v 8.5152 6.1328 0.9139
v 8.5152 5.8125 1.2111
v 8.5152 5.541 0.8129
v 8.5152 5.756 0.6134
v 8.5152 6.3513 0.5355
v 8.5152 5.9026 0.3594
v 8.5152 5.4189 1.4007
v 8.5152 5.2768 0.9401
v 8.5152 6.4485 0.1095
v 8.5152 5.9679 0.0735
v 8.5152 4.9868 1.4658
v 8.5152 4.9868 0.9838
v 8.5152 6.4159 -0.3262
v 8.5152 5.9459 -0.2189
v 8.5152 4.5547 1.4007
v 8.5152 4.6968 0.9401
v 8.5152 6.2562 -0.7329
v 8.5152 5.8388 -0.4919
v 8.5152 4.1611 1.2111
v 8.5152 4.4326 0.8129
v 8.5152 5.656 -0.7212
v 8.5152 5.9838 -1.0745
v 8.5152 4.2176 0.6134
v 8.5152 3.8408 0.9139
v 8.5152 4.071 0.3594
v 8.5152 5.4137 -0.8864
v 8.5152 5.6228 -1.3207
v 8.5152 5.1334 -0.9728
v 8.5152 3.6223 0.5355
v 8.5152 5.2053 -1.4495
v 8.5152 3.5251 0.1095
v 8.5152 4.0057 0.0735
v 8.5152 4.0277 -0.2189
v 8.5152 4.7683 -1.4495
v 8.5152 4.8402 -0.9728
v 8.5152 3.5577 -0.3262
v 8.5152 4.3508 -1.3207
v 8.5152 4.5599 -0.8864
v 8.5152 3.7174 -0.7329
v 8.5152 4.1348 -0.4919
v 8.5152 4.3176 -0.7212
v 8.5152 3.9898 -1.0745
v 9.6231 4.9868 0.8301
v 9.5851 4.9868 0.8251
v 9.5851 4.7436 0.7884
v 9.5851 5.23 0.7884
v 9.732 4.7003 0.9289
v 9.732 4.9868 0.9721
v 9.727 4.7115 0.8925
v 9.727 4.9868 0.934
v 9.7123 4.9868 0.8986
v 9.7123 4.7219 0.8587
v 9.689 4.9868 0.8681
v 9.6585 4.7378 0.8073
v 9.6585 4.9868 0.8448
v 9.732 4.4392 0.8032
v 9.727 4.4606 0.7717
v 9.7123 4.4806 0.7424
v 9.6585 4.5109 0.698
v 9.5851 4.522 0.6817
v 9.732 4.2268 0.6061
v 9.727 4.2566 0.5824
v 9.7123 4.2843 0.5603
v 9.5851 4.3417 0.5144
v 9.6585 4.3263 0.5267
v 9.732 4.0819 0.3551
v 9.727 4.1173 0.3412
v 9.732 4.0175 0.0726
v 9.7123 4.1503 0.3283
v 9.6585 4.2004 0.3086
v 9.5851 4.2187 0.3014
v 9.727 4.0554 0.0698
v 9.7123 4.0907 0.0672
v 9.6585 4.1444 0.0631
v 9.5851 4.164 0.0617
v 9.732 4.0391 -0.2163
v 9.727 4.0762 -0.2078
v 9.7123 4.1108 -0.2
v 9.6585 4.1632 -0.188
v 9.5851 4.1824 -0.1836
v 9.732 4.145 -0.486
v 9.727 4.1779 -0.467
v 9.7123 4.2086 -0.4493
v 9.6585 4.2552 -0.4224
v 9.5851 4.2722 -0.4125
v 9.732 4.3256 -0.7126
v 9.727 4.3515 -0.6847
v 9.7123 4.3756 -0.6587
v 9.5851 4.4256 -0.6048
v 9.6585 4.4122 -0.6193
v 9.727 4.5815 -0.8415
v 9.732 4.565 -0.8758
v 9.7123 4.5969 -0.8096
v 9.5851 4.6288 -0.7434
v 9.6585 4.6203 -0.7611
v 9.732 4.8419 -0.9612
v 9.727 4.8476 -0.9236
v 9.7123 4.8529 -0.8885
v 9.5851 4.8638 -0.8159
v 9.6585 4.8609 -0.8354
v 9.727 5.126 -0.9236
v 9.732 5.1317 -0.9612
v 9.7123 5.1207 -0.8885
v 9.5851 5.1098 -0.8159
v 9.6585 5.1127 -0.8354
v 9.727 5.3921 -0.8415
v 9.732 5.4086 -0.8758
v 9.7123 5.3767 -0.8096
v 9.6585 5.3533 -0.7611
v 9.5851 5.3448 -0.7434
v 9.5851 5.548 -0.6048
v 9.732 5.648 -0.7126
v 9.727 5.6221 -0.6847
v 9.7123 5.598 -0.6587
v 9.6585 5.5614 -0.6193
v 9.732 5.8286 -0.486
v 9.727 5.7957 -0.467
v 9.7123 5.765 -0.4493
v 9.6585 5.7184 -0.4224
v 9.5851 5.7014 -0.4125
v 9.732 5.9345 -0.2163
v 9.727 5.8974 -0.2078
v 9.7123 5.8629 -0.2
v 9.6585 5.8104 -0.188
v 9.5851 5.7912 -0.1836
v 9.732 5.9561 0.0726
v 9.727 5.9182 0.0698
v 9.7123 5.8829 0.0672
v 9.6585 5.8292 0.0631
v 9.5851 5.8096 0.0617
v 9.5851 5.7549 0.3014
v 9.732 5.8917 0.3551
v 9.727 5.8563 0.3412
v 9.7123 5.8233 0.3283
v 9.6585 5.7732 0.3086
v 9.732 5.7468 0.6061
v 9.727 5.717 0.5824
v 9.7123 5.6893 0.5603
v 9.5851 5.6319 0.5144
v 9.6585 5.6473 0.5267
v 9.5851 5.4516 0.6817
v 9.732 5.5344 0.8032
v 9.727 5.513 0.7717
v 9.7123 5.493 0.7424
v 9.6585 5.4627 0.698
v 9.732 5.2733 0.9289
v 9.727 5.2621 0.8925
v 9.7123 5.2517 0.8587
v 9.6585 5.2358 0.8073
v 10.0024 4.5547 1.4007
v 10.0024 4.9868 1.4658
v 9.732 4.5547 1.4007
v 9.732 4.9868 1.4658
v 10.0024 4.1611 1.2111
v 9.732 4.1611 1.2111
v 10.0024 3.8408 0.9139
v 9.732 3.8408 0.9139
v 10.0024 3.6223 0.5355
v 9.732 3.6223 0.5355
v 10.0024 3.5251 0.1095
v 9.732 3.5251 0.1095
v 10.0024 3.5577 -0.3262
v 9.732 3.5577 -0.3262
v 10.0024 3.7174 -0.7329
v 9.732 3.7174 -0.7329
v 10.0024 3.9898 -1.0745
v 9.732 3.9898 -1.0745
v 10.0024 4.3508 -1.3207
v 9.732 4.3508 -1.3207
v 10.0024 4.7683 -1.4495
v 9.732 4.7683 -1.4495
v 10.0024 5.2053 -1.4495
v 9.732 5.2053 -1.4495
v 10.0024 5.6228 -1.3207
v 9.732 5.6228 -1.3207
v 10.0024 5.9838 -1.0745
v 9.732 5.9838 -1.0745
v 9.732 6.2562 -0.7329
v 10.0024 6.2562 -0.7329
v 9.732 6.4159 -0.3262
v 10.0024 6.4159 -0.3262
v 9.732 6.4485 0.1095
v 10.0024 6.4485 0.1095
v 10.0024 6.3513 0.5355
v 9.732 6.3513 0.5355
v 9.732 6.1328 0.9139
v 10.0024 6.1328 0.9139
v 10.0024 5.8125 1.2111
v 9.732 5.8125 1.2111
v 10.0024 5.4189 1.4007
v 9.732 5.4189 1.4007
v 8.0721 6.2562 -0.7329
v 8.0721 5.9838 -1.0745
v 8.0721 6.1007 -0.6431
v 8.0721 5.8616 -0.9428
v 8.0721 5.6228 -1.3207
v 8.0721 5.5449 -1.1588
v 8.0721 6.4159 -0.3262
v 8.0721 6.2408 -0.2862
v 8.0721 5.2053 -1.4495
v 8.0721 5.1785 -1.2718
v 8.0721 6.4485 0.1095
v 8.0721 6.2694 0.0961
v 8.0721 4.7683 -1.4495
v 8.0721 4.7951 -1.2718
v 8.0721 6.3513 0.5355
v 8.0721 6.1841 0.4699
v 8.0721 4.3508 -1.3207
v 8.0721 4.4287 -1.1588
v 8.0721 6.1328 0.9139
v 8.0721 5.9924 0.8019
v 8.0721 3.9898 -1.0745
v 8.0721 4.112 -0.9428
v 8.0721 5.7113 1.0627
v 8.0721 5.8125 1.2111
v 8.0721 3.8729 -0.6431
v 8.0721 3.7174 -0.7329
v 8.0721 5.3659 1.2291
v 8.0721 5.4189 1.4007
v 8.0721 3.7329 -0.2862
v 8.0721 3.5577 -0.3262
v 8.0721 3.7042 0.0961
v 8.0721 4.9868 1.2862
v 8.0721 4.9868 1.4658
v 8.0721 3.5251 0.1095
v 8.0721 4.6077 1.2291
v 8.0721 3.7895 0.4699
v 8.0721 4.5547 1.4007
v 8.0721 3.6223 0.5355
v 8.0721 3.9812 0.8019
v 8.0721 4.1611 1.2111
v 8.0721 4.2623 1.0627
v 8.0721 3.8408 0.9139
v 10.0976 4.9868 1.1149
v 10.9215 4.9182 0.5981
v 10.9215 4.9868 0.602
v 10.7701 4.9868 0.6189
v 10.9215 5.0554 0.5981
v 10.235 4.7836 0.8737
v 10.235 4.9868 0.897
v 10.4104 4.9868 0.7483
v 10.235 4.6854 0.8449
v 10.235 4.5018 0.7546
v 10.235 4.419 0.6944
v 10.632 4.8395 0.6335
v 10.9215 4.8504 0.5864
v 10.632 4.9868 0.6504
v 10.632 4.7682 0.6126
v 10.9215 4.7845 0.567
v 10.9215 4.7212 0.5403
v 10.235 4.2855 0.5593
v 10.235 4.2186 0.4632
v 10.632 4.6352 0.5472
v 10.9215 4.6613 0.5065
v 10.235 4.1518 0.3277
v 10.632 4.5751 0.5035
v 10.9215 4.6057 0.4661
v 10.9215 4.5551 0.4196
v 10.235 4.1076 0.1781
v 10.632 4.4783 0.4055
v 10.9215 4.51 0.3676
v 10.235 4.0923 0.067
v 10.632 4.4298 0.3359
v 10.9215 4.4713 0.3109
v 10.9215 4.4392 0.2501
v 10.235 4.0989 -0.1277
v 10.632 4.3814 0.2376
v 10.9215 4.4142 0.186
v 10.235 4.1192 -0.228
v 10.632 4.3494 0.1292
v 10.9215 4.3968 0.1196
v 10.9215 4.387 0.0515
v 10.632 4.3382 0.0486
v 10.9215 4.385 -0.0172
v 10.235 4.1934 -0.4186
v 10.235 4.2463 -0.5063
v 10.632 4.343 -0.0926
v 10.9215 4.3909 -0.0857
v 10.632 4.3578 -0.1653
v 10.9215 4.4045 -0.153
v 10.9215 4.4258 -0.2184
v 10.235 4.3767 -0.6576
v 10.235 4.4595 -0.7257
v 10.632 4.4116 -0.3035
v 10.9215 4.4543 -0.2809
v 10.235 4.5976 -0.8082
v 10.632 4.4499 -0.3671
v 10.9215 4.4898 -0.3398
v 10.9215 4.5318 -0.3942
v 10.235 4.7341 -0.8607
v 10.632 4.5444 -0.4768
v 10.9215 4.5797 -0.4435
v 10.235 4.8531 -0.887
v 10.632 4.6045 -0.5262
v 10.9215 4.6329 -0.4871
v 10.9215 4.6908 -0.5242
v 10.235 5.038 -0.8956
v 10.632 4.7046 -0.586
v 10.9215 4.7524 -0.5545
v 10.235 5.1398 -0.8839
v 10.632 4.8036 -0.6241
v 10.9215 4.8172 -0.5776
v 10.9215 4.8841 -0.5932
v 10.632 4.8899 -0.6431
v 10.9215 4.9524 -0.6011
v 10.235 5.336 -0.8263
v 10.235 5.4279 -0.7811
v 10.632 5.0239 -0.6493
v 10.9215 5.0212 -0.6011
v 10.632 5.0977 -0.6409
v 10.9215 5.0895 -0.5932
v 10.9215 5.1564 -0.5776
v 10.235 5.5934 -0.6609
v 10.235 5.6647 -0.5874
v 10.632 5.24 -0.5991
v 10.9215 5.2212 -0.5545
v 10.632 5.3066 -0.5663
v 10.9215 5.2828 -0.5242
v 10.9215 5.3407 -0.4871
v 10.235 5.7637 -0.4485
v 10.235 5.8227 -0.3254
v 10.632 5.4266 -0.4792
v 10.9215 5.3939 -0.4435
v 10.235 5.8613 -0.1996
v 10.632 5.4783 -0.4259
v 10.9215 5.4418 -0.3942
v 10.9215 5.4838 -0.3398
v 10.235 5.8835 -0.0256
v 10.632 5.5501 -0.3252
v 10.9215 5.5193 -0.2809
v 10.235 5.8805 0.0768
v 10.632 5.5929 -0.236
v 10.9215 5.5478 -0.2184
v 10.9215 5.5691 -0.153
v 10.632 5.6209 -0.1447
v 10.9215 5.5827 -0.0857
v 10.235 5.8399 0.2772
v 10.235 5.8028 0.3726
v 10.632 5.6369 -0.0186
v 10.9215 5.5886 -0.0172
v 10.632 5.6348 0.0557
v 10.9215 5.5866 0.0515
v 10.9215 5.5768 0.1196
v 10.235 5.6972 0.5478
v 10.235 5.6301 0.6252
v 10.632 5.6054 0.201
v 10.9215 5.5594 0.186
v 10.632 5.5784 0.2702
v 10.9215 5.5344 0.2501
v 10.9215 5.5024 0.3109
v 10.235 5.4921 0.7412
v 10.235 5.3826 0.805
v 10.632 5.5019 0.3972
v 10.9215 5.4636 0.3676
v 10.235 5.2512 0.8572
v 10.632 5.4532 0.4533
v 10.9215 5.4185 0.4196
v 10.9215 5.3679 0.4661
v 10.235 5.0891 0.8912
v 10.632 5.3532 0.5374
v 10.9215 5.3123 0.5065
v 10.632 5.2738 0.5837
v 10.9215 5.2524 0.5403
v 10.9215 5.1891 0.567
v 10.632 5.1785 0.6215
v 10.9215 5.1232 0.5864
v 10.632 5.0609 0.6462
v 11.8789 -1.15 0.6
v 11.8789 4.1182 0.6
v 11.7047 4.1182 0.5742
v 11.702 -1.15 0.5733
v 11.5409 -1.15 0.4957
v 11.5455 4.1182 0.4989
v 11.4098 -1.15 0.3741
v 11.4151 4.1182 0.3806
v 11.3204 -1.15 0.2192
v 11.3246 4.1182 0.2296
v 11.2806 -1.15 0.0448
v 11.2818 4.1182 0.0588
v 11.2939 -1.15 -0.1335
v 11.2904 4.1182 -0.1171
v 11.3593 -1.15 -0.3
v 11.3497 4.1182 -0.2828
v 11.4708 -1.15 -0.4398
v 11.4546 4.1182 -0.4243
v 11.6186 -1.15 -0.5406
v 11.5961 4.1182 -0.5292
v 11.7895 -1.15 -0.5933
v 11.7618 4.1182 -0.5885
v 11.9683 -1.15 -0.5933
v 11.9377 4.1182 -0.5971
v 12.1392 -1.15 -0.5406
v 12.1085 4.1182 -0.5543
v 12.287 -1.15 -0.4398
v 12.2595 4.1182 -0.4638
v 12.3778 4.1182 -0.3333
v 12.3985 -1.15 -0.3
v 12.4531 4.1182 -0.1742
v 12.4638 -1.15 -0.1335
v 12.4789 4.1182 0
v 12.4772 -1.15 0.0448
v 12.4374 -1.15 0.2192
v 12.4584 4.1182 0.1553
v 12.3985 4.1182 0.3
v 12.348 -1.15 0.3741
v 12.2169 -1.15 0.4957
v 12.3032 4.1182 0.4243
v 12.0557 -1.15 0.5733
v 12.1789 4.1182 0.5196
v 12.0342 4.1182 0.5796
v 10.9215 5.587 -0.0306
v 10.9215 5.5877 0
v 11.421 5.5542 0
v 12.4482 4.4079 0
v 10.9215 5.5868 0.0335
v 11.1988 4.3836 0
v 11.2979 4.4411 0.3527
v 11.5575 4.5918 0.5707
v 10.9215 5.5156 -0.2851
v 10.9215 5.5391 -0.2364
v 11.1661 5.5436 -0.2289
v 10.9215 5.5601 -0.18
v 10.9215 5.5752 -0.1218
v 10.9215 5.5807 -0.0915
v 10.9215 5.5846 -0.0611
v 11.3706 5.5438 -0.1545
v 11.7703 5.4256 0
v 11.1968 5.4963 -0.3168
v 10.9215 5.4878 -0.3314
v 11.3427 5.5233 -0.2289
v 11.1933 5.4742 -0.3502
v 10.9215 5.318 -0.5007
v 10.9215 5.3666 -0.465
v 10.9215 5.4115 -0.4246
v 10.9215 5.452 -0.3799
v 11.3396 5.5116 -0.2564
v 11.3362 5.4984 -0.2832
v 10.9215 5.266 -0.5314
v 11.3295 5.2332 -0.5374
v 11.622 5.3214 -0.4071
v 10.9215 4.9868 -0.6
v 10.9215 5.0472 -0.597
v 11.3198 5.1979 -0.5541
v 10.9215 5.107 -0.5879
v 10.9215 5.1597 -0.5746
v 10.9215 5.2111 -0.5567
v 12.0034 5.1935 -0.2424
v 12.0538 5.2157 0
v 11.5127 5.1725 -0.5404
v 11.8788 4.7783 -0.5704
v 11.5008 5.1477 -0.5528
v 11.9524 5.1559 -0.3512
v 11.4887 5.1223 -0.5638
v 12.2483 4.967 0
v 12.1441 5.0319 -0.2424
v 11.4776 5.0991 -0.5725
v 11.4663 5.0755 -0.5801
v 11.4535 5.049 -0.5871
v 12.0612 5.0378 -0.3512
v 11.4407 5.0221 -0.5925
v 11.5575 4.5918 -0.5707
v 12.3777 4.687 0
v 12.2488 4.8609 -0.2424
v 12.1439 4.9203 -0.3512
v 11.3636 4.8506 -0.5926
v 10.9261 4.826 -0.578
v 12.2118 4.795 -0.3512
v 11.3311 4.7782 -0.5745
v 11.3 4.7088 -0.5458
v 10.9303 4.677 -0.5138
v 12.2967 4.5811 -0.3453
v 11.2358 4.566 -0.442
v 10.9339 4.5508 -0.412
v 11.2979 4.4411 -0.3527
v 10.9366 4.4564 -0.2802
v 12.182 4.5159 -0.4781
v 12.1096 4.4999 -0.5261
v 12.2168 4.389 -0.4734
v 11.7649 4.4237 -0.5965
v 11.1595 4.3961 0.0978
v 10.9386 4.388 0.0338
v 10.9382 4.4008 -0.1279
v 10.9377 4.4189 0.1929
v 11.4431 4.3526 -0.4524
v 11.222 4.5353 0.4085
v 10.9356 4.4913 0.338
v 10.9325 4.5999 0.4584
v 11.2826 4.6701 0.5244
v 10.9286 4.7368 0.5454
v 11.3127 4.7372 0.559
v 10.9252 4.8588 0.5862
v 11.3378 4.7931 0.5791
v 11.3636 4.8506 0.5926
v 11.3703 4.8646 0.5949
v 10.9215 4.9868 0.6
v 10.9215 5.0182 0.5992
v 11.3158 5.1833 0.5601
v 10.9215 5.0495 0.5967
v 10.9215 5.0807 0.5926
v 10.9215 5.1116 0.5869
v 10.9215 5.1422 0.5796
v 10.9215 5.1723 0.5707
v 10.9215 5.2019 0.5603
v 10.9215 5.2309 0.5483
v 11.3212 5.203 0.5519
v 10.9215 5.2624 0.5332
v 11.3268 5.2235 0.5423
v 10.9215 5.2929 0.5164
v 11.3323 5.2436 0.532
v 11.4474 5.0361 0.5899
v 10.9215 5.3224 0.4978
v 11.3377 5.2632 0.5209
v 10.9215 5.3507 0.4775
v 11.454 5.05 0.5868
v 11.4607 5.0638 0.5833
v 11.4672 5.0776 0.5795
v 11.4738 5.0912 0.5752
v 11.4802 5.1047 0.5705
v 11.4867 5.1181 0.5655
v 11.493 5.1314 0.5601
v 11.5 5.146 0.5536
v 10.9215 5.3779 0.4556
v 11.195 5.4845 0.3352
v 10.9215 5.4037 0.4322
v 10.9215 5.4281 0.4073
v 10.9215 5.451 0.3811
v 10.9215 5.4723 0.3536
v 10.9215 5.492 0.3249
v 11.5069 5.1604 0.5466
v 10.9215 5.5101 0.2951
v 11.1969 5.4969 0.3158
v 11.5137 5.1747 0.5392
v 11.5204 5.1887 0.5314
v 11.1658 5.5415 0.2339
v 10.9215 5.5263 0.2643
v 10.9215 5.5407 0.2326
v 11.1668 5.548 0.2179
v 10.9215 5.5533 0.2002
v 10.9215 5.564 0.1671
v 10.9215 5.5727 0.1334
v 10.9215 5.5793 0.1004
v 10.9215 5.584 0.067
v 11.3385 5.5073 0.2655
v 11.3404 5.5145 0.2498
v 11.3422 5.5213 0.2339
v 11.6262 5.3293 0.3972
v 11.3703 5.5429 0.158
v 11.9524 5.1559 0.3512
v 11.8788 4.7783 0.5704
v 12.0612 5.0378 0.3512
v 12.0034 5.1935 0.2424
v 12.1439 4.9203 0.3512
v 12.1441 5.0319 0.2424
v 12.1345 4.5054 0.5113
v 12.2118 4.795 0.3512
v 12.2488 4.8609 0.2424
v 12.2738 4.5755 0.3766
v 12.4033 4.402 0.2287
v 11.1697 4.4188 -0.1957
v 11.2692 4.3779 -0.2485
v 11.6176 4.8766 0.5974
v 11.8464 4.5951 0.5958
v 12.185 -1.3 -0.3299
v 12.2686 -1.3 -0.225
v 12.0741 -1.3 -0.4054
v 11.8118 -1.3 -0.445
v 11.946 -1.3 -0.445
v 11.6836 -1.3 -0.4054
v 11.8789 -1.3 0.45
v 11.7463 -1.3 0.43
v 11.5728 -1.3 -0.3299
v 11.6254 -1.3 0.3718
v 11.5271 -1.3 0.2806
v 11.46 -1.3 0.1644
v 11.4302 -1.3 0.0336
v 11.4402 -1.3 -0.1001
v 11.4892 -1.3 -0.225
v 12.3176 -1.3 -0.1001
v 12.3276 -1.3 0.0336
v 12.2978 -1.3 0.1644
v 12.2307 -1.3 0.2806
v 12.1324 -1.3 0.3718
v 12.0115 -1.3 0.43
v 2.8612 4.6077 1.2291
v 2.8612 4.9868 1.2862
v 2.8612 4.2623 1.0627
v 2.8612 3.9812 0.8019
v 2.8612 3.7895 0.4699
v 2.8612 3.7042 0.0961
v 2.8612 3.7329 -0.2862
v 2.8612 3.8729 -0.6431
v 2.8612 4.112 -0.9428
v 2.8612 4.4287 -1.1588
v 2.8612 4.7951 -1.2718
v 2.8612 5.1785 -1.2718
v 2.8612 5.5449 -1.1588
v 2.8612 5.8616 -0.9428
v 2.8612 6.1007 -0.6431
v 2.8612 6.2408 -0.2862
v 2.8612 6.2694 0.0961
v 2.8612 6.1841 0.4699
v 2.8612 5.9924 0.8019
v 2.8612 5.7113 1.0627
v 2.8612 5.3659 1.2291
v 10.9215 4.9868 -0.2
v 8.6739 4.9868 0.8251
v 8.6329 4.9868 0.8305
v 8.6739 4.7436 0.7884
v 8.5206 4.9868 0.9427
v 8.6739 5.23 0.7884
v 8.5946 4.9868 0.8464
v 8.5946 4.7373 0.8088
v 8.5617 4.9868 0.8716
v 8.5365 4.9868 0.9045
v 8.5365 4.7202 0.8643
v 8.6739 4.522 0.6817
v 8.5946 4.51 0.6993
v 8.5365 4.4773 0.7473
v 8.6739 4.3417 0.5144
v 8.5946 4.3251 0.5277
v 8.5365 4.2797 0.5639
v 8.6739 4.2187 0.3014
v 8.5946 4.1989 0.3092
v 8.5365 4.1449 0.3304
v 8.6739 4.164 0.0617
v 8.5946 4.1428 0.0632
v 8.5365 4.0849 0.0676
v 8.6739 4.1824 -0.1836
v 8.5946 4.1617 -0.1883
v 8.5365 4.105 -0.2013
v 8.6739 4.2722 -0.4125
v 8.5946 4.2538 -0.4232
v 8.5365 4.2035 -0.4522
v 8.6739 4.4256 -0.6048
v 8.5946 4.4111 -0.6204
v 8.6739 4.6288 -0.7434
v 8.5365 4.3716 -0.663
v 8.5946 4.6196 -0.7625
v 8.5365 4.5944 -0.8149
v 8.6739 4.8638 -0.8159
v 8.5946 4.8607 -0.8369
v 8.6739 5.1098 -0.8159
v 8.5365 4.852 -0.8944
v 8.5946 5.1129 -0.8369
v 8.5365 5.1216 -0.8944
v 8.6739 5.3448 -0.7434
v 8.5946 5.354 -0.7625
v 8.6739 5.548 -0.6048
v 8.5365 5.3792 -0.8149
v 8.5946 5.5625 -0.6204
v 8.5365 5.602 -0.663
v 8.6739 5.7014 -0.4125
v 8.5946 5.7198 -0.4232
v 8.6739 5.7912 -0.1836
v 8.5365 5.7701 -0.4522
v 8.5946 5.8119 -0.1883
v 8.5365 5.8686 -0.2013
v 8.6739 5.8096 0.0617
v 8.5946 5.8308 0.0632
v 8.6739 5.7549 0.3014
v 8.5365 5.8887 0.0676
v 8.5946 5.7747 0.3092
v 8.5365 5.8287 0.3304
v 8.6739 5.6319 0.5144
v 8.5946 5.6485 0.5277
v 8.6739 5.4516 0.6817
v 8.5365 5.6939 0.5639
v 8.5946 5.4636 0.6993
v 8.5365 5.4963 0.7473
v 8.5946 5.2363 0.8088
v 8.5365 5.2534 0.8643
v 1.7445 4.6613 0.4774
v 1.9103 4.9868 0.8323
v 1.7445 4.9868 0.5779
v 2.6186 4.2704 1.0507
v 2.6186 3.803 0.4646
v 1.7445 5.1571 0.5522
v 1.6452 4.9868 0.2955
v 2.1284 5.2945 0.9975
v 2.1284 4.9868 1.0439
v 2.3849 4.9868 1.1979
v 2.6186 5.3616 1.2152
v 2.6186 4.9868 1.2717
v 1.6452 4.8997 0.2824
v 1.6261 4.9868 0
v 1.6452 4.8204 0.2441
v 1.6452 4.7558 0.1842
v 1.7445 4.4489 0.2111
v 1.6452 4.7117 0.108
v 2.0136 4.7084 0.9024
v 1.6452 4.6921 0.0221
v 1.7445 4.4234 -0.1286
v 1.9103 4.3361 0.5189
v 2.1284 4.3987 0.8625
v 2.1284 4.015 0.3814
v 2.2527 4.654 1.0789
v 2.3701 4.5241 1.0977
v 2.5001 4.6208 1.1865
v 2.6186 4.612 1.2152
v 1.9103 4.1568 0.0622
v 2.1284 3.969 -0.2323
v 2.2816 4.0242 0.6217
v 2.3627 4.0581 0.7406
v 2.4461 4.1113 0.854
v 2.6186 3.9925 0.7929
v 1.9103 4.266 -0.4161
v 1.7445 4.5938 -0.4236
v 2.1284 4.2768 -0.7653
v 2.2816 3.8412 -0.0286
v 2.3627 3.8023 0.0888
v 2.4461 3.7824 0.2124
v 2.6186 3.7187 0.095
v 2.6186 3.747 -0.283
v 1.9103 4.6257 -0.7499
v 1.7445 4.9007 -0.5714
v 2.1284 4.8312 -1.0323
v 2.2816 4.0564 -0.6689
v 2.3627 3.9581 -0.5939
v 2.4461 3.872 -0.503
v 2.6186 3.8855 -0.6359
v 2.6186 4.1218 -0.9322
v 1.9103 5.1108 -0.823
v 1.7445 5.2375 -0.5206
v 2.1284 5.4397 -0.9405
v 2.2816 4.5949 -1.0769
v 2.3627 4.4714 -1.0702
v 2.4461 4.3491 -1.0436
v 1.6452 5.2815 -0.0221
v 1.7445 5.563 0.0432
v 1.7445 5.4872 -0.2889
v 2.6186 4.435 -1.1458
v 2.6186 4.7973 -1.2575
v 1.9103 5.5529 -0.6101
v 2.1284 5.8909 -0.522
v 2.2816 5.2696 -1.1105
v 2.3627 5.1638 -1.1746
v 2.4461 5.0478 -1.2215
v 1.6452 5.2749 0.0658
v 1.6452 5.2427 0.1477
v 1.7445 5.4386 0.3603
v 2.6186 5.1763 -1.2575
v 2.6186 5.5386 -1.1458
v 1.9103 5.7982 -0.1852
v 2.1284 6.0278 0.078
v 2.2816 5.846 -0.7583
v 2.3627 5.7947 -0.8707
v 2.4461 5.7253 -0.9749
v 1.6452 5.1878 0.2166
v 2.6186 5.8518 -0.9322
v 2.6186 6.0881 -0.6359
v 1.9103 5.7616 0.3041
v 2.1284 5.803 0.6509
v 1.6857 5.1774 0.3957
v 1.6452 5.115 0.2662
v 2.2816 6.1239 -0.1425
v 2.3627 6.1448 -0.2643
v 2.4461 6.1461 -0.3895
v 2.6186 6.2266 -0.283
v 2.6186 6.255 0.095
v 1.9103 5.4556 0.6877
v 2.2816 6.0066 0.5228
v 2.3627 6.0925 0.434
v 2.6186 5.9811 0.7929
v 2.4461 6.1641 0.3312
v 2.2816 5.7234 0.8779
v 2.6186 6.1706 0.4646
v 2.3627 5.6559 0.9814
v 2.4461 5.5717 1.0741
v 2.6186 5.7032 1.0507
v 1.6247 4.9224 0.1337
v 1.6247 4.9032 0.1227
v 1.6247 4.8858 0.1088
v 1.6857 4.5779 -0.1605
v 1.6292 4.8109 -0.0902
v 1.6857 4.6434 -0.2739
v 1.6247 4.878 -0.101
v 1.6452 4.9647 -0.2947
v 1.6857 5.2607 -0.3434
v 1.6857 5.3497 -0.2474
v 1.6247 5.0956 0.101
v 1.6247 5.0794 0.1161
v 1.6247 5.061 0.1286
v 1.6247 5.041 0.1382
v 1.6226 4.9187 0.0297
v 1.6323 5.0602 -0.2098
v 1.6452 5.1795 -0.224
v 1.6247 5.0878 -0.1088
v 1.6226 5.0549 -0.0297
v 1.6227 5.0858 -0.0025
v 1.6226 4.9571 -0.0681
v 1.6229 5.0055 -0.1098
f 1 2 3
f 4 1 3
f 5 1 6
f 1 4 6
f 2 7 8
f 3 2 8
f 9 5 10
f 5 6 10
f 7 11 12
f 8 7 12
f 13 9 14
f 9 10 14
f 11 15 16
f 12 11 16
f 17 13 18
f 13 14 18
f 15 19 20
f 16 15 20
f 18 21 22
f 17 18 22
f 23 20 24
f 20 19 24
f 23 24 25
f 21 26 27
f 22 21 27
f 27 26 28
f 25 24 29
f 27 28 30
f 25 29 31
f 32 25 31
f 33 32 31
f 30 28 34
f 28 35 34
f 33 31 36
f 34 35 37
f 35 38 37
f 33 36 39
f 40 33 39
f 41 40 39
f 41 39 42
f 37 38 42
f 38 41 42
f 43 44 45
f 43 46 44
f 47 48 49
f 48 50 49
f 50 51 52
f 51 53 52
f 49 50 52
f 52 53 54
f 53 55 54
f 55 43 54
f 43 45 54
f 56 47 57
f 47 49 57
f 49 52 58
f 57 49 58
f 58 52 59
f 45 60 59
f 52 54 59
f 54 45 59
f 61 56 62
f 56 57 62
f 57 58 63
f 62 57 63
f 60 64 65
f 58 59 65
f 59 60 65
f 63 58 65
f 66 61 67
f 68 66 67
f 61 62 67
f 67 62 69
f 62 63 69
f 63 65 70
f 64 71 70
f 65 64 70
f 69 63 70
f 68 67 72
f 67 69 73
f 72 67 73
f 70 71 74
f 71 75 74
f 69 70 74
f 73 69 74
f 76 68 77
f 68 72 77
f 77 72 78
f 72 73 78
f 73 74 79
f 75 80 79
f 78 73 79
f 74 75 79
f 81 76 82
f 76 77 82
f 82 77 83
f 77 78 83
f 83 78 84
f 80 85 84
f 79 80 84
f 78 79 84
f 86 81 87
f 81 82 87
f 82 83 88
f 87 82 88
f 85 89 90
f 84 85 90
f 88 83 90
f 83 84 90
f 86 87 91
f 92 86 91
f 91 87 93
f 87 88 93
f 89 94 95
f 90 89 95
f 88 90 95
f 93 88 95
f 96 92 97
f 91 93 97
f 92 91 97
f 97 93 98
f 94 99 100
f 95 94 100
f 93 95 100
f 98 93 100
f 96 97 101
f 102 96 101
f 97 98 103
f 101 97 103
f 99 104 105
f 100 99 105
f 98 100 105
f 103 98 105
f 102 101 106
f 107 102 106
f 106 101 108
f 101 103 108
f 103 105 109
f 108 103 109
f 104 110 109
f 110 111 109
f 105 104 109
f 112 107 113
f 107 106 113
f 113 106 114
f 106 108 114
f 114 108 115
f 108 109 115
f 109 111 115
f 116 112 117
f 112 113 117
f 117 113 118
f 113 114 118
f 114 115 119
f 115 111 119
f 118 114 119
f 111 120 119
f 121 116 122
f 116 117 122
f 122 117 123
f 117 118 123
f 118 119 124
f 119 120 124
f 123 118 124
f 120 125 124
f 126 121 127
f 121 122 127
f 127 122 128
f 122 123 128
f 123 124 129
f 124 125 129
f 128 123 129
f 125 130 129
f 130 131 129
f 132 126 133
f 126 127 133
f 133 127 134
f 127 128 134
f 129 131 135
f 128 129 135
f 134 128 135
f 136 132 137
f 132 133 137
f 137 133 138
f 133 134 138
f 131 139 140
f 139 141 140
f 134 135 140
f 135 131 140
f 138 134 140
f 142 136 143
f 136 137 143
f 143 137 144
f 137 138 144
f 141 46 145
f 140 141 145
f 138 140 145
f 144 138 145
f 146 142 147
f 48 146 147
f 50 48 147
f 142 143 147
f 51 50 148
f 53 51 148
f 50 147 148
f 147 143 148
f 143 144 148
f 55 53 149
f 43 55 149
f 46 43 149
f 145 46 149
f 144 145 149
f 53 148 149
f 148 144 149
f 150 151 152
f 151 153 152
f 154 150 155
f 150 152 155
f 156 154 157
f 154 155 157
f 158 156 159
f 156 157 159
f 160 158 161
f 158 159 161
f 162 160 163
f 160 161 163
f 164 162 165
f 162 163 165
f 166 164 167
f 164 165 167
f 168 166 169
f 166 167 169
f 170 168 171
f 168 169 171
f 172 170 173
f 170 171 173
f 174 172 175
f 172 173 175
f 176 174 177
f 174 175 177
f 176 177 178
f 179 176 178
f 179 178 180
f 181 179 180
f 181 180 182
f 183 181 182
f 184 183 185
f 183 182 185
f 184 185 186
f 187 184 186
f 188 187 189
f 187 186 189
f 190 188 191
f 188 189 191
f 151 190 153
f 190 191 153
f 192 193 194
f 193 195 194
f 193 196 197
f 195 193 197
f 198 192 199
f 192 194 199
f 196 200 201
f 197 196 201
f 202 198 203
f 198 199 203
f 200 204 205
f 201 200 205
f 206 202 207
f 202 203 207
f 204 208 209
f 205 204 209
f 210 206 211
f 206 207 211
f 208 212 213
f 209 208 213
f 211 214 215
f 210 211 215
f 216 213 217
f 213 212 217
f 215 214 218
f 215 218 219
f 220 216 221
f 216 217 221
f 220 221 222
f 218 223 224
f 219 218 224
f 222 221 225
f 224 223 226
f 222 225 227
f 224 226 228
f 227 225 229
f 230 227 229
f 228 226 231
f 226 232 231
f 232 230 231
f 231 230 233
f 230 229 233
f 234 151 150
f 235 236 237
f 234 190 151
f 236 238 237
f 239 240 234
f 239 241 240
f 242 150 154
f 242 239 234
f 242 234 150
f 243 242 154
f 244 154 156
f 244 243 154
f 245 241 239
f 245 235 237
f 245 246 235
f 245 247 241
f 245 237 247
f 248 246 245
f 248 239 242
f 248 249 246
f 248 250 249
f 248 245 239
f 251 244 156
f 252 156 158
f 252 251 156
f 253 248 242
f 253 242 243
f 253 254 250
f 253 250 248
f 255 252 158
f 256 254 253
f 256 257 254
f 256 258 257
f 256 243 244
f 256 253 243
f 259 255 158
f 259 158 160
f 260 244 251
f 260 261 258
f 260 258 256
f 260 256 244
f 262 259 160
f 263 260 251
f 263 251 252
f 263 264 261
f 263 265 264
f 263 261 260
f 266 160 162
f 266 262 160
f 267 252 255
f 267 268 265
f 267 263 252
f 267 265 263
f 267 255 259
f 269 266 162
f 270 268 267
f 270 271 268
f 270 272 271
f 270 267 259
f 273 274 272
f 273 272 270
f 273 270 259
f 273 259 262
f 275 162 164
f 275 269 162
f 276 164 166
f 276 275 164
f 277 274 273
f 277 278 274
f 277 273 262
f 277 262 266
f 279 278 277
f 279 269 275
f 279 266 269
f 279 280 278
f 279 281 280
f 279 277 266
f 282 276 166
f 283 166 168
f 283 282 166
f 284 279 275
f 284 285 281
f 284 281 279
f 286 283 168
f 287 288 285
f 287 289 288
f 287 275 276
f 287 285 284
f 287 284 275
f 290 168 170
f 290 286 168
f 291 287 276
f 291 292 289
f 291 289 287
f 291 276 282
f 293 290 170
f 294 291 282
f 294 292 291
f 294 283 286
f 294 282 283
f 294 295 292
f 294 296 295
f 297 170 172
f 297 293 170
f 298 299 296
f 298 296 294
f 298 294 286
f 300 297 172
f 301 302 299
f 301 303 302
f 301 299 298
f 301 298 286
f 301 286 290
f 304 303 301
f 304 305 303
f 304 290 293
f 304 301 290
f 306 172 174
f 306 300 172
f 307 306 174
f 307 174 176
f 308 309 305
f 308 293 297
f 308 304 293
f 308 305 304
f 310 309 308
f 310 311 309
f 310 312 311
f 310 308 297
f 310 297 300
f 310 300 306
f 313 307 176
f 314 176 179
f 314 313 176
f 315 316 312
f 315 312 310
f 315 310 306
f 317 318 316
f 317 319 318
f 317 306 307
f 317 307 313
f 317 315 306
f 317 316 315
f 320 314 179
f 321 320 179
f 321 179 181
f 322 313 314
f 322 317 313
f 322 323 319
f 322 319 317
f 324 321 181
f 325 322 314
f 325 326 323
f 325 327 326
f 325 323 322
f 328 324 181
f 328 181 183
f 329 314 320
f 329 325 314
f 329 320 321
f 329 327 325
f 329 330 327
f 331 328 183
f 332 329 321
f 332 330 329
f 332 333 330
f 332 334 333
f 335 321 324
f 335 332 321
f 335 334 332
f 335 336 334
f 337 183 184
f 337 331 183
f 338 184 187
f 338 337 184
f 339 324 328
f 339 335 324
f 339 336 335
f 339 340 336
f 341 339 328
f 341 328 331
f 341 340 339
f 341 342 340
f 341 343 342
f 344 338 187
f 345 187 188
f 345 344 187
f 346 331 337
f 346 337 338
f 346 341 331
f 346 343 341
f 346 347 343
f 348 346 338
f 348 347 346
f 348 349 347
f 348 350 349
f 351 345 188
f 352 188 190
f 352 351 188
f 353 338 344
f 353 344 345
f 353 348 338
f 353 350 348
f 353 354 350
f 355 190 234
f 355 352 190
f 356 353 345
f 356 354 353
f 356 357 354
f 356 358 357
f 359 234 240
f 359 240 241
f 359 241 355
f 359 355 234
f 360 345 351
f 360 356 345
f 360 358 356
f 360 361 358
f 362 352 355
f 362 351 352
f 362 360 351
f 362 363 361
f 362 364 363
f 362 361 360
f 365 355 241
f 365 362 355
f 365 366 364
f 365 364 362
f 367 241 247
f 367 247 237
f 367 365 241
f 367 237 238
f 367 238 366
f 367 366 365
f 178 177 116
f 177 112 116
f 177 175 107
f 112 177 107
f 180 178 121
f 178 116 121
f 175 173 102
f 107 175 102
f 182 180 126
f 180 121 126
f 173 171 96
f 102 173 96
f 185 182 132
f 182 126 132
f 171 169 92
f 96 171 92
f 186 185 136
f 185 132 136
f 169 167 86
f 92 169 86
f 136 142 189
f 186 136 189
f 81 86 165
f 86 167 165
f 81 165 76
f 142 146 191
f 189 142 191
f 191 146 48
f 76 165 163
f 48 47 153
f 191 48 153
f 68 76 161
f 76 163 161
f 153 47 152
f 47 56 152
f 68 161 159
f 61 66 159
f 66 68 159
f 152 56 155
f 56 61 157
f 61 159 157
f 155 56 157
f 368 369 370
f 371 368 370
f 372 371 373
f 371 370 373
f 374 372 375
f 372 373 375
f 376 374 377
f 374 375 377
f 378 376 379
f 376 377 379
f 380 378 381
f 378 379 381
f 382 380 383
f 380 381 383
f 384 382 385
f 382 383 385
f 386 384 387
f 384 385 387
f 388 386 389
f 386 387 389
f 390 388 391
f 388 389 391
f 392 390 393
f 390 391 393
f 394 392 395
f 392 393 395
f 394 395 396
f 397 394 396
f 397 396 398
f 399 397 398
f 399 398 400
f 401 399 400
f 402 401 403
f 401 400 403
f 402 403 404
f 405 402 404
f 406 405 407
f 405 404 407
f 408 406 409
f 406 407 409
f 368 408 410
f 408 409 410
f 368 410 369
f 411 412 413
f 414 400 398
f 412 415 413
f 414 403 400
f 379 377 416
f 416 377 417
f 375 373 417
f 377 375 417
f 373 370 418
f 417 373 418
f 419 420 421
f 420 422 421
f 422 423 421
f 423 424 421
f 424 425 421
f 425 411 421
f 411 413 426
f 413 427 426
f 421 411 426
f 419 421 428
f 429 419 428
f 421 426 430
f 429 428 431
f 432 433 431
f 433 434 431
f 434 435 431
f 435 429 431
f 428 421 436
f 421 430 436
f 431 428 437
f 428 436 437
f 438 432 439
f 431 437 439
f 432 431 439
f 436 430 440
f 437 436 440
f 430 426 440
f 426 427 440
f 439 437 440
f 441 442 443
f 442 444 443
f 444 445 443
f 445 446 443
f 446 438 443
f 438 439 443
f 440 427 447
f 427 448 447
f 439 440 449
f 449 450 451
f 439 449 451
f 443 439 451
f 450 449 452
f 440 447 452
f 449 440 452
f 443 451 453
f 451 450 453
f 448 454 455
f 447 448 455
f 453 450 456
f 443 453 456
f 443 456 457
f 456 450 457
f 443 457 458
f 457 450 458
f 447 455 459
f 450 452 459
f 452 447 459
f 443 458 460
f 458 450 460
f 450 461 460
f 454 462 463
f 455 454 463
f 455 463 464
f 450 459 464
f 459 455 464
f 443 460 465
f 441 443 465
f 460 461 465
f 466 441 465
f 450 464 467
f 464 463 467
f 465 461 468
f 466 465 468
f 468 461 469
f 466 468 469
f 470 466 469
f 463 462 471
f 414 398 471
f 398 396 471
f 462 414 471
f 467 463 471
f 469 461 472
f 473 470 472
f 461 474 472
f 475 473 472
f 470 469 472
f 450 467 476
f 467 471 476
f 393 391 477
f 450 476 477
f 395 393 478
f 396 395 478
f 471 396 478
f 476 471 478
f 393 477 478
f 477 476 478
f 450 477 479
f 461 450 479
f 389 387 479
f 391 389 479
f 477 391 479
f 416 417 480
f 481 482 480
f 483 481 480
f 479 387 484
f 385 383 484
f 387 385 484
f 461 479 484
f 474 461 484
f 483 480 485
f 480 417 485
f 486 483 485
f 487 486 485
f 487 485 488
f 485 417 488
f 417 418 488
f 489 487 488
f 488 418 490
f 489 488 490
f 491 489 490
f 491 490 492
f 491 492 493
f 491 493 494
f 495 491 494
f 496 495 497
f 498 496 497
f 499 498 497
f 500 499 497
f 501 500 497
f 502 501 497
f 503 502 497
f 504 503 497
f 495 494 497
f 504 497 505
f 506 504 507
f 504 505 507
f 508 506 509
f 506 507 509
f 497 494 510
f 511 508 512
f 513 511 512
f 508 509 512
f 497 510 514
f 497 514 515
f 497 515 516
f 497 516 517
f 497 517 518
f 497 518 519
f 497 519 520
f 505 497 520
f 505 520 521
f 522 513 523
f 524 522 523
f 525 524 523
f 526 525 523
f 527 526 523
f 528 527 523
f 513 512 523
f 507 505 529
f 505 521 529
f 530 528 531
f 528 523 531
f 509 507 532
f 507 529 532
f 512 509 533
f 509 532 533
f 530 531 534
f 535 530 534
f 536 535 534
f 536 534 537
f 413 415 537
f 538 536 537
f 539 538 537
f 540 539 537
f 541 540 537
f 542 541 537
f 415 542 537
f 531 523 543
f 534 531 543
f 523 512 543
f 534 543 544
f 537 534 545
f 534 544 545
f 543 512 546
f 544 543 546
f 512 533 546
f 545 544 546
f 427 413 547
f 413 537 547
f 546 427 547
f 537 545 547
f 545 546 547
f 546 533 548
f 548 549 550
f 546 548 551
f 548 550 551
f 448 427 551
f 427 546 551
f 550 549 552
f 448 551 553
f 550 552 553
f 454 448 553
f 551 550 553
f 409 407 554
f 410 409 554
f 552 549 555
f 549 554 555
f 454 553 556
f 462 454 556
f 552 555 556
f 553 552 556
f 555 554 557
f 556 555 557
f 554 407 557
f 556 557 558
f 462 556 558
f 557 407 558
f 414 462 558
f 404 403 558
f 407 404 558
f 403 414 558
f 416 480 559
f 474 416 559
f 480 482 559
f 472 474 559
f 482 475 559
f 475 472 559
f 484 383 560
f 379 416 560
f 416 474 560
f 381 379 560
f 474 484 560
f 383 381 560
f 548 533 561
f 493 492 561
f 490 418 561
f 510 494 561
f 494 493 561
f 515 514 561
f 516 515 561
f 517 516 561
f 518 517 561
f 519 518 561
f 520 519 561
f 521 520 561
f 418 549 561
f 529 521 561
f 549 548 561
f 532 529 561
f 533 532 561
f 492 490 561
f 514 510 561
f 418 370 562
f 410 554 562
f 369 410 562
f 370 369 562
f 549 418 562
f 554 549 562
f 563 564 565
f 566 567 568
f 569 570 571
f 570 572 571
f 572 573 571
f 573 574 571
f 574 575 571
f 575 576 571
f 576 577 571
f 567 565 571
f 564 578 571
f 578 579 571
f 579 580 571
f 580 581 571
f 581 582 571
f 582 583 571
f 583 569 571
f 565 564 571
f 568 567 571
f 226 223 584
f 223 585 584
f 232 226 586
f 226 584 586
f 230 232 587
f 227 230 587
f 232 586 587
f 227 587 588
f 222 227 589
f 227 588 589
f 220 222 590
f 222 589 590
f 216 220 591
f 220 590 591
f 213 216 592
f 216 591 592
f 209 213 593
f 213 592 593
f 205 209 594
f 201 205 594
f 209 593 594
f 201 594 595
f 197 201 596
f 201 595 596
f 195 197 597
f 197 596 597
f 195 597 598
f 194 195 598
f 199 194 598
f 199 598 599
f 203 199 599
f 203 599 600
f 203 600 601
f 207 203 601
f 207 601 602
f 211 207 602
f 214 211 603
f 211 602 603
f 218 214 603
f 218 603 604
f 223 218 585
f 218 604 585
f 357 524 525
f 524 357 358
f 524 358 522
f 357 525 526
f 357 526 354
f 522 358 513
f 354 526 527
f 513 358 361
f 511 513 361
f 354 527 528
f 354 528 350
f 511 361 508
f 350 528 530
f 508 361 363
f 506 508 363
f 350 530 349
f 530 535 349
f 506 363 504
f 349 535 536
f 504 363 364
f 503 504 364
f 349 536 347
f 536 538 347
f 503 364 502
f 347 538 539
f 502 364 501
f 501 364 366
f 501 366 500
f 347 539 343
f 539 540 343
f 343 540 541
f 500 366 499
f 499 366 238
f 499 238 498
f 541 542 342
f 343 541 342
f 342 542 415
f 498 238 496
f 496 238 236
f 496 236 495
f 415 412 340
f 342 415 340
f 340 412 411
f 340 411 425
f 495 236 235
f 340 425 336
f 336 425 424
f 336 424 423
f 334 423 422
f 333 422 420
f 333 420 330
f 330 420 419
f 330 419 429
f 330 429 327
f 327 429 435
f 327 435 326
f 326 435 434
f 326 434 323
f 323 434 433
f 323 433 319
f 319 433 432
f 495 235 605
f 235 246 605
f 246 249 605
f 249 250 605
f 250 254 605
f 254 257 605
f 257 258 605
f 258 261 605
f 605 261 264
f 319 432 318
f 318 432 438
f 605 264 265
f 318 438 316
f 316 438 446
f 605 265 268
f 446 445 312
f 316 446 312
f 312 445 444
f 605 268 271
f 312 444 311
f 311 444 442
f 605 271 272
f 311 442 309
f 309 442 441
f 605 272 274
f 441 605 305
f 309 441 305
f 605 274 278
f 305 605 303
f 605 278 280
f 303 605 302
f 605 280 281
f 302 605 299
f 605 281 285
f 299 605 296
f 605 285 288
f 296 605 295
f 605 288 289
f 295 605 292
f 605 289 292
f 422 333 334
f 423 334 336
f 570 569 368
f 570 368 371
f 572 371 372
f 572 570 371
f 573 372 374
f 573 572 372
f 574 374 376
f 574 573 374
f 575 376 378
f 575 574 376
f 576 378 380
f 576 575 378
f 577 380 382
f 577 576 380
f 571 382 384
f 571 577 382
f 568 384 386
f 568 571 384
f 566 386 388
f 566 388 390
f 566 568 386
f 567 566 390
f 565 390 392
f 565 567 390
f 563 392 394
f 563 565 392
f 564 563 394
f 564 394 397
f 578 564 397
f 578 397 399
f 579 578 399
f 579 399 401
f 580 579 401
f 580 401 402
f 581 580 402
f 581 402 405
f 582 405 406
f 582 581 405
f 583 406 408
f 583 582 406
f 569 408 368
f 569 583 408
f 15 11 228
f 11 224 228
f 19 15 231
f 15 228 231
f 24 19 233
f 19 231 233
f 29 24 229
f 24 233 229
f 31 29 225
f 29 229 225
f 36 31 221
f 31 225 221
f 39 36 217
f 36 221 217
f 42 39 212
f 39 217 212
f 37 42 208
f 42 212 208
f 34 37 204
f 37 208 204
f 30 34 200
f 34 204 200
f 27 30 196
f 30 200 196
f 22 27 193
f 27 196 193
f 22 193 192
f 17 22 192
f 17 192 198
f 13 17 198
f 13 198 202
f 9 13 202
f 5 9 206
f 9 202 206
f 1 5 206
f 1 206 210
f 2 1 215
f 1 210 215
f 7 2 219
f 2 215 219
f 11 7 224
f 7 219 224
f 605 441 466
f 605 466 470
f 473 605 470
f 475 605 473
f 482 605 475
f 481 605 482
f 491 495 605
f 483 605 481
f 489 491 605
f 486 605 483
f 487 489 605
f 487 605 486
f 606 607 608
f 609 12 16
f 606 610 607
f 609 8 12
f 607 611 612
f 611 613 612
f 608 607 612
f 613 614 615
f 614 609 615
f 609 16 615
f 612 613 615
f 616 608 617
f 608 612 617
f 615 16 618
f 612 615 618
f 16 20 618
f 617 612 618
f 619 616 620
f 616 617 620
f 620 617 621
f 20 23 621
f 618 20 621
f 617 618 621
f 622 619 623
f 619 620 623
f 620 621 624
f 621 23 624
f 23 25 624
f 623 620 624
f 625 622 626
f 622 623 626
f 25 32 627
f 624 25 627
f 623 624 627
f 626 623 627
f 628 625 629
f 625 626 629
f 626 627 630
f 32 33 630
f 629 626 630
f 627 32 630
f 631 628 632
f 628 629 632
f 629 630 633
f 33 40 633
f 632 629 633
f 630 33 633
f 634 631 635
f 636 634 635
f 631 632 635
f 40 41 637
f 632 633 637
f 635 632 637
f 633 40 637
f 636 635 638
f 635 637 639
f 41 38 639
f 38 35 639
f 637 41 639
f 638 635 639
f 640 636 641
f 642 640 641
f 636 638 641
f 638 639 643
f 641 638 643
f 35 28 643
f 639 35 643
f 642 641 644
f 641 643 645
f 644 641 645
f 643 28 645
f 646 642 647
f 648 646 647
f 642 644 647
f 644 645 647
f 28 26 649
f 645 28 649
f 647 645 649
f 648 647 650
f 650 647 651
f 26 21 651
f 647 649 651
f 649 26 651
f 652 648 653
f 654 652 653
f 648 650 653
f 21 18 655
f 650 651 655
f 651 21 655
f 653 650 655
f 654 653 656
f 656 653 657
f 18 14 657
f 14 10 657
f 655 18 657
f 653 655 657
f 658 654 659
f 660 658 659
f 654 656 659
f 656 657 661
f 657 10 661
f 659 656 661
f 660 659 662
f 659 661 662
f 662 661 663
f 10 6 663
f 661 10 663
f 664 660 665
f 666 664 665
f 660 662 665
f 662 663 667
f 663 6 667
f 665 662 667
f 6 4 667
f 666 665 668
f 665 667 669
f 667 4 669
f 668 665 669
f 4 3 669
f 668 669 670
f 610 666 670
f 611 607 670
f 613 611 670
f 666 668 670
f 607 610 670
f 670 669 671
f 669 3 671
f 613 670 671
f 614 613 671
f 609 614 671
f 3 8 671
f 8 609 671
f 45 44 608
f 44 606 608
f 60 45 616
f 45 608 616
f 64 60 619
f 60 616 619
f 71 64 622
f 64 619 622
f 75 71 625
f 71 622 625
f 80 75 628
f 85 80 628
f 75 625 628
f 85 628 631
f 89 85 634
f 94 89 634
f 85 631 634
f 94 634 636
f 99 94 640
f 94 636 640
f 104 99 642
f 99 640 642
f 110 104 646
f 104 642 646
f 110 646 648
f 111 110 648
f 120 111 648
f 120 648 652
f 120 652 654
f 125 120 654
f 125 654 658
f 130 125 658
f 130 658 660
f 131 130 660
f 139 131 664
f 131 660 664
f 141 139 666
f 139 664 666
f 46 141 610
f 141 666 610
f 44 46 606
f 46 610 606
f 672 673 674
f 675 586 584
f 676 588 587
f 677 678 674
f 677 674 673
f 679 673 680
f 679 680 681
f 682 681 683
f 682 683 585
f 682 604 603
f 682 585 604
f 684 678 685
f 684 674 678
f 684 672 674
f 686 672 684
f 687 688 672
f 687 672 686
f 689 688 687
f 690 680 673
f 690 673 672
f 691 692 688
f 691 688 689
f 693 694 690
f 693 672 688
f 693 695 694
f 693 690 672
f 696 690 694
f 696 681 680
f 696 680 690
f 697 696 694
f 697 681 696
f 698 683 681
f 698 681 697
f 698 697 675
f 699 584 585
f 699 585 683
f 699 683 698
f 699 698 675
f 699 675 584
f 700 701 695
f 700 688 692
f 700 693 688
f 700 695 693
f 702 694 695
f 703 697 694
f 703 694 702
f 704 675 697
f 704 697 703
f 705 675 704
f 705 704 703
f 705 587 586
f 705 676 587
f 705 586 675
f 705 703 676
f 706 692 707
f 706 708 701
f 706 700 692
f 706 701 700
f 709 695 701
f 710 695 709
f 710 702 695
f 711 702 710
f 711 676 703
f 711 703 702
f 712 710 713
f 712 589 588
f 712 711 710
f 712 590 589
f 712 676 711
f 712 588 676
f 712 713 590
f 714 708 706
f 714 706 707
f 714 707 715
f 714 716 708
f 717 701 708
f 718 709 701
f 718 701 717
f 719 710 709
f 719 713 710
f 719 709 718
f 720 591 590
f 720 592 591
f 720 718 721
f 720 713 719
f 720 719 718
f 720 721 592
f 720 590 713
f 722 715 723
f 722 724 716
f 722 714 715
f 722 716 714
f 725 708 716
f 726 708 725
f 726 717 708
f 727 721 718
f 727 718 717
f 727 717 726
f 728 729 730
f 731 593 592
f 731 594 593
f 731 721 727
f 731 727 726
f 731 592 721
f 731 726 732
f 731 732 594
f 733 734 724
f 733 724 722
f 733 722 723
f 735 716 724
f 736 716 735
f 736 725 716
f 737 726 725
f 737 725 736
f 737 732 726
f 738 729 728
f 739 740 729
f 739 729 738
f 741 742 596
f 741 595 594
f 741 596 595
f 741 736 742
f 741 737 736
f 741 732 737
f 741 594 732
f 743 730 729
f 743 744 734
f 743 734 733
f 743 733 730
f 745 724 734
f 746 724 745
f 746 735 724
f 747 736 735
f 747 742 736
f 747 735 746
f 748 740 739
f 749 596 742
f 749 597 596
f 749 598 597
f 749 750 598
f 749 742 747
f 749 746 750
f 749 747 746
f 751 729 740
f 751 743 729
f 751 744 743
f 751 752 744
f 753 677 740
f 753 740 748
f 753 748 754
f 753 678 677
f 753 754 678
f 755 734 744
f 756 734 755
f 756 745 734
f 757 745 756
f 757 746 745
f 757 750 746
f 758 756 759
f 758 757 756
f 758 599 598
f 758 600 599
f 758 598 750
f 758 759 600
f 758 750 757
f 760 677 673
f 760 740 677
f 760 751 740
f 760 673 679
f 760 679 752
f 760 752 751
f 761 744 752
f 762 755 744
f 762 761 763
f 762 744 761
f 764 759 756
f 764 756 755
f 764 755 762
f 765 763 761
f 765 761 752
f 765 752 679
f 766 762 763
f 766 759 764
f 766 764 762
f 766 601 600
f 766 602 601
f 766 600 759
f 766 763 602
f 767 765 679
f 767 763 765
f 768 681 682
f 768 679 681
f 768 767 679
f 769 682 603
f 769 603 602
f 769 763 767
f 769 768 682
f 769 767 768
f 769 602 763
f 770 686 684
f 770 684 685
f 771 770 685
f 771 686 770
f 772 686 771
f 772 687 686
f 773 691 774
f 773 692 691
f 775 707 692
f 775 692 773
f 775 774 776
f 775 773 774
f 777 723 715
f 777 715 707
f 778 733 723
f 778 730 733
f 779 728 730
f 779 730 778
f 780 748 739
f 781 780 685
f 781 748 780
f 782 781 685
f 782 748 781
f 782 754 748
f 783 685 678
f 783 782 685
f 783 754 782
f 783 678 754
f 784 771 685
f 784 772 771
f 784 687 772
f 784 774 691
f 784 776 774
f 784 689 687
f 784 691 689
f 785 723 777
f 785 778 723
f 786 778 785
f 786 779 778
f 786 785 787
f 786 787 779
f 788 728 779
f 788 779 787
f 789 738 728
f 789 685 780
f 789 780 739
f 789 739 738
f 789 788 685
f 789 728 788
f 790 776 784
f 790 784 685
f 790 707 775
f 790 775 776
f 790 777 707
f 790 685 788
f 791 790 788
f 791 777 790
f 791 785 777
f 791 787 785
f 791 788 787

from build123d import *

# Parameters (mm, degrees)
SKETCH2_W     = 0.6
SKETCH2_H     = 4.118227863
SKETCH2_H_2   = 1.3
SKETCH10_R    = 0.6
CHAMFER1_SIZE = 0.15


with BuildPart() as part:
    # Sketch1 → Revolve1 (revolve)
    with BuildSketch(Plane.XY, mode=Mode.PRIVATE) as revolve1_sk:
        with BuildLine():
            Line((1.626095531, 4.986801801), (10.92153598, 4.986801801))
            Line((10.92153598, 4.986801801), (10.92153598, 5.588836435))
            add(Edge.make_bspline(
                [(10.00241881, 6.452631049), (10.113570909, 5.637430805), (10.92153598, 5.588836435)],
                knots=[0, 0, 0, 1, 1, 1], degree=2))
            Line((10.00241881, 6.452631049), (9.732019166, 6.452631049))
            Line((9.732019166, 6.452631049), (9.732019166, 5.958857786))
            ThreePointArc((9.732019166, 5.958857786), (9.688976654, 5.854943969), (9.585062838, 5.811901457))
            Line((9.585062838, 5.811901457), (8.673933602, 5.811901457))
            ThreePointArc((8.673933602, 5.811901457), (8.56170668, 5.85838737), (8.515220767, 5.970614292))
            Line((8.515220767, 5.970614292), (8.515220767, 6.452631049))
            Line((8.515220767, 6.452631049), (8.072127944, 6.452631049))
            Line((8.072127944, 6.452631049), (8.072127944, 6.272997822))
            Line((8.072127944, 6.272997822), (2.861199395, 6.272997822))
            add(Edge.make_bspline(
                [(1.626095531, 4.986801801), (1.568844138, 5.647468558), (2.210932821, 6.320979116), (2.861199395, 6.272997822)],
                knots=[0, 0, 0, 0, 1, 1, 1, 1], degree=3))
        make_face()
    revolve(revolve1_sk.sketch.rotate(Axis((1.626095531, 4.986801801, 0), (1, 0, 0)), 90), axis=Axis((1.626095531, 4.986801801, 0), (1, 0, 0)))



with BuildPart() as body_2:
    # Sketch2 → Revolve2 (revolve)
    with BuildSketch(Plane.XY, mode=Mode.PRIVATE) as revolve2_sk:
        with Locations((12.178892064, 2.059113932)):
            Rectangle(SKETCH2_W, SKETCH2_H)
        with Locations((12.178892064, -0.65)):
            Rectangle(SKETCH2_W, SKETCH2_H_2)
    revolve(revolve2_sk.sketch.rotate(Axis((11.878892064, 4.118227863, 0), (0, -1, 0)), 90), axis=Axis((11.878892064, 4.118227863, 0), (0, -1, 0)))


with BuildPart() as part_1:
    add(part.part)

    add(body_2.part)  # Sweep1 merges body 2
    # Sweep1: sweep along a path in Sketch3
    with BuildLine() as sweep1_path:  # in the path sketch's own coordinates; laid on its plane below (add() does not lay a ready-made edge on the line's plane)
        add(Edge.make_bspline(
            [(10.92153598, 4.986801801), (11.822294838, 5.066317243), (11.878892064, 4.118227863)],
            knots=[0, 0, 0, 1, 1, 1], degree=2))
    # Sketch10 → Sweep1 (sweep)
    with BuildSketch(Plane(origin=(0, 4.118227863, 0), x_dir=(1, 0, 0), z_dir=(0, 1, 0))):
        with Locations((11.878892064, 0)):
            Circle(SKETCH10_R)
    sweep(path=Plane.XY * sweep1_path.line)

    # Chamfer1
    chamfer1_edges = [part_1.edges().sort_by_distance(p)[0] for p in [
        (11.878892064, -1.3, -0.6),
    ]]
    chamfer(chamfer1_edges, length=CHAMFER1_SIZE)


solid = part_1.part
